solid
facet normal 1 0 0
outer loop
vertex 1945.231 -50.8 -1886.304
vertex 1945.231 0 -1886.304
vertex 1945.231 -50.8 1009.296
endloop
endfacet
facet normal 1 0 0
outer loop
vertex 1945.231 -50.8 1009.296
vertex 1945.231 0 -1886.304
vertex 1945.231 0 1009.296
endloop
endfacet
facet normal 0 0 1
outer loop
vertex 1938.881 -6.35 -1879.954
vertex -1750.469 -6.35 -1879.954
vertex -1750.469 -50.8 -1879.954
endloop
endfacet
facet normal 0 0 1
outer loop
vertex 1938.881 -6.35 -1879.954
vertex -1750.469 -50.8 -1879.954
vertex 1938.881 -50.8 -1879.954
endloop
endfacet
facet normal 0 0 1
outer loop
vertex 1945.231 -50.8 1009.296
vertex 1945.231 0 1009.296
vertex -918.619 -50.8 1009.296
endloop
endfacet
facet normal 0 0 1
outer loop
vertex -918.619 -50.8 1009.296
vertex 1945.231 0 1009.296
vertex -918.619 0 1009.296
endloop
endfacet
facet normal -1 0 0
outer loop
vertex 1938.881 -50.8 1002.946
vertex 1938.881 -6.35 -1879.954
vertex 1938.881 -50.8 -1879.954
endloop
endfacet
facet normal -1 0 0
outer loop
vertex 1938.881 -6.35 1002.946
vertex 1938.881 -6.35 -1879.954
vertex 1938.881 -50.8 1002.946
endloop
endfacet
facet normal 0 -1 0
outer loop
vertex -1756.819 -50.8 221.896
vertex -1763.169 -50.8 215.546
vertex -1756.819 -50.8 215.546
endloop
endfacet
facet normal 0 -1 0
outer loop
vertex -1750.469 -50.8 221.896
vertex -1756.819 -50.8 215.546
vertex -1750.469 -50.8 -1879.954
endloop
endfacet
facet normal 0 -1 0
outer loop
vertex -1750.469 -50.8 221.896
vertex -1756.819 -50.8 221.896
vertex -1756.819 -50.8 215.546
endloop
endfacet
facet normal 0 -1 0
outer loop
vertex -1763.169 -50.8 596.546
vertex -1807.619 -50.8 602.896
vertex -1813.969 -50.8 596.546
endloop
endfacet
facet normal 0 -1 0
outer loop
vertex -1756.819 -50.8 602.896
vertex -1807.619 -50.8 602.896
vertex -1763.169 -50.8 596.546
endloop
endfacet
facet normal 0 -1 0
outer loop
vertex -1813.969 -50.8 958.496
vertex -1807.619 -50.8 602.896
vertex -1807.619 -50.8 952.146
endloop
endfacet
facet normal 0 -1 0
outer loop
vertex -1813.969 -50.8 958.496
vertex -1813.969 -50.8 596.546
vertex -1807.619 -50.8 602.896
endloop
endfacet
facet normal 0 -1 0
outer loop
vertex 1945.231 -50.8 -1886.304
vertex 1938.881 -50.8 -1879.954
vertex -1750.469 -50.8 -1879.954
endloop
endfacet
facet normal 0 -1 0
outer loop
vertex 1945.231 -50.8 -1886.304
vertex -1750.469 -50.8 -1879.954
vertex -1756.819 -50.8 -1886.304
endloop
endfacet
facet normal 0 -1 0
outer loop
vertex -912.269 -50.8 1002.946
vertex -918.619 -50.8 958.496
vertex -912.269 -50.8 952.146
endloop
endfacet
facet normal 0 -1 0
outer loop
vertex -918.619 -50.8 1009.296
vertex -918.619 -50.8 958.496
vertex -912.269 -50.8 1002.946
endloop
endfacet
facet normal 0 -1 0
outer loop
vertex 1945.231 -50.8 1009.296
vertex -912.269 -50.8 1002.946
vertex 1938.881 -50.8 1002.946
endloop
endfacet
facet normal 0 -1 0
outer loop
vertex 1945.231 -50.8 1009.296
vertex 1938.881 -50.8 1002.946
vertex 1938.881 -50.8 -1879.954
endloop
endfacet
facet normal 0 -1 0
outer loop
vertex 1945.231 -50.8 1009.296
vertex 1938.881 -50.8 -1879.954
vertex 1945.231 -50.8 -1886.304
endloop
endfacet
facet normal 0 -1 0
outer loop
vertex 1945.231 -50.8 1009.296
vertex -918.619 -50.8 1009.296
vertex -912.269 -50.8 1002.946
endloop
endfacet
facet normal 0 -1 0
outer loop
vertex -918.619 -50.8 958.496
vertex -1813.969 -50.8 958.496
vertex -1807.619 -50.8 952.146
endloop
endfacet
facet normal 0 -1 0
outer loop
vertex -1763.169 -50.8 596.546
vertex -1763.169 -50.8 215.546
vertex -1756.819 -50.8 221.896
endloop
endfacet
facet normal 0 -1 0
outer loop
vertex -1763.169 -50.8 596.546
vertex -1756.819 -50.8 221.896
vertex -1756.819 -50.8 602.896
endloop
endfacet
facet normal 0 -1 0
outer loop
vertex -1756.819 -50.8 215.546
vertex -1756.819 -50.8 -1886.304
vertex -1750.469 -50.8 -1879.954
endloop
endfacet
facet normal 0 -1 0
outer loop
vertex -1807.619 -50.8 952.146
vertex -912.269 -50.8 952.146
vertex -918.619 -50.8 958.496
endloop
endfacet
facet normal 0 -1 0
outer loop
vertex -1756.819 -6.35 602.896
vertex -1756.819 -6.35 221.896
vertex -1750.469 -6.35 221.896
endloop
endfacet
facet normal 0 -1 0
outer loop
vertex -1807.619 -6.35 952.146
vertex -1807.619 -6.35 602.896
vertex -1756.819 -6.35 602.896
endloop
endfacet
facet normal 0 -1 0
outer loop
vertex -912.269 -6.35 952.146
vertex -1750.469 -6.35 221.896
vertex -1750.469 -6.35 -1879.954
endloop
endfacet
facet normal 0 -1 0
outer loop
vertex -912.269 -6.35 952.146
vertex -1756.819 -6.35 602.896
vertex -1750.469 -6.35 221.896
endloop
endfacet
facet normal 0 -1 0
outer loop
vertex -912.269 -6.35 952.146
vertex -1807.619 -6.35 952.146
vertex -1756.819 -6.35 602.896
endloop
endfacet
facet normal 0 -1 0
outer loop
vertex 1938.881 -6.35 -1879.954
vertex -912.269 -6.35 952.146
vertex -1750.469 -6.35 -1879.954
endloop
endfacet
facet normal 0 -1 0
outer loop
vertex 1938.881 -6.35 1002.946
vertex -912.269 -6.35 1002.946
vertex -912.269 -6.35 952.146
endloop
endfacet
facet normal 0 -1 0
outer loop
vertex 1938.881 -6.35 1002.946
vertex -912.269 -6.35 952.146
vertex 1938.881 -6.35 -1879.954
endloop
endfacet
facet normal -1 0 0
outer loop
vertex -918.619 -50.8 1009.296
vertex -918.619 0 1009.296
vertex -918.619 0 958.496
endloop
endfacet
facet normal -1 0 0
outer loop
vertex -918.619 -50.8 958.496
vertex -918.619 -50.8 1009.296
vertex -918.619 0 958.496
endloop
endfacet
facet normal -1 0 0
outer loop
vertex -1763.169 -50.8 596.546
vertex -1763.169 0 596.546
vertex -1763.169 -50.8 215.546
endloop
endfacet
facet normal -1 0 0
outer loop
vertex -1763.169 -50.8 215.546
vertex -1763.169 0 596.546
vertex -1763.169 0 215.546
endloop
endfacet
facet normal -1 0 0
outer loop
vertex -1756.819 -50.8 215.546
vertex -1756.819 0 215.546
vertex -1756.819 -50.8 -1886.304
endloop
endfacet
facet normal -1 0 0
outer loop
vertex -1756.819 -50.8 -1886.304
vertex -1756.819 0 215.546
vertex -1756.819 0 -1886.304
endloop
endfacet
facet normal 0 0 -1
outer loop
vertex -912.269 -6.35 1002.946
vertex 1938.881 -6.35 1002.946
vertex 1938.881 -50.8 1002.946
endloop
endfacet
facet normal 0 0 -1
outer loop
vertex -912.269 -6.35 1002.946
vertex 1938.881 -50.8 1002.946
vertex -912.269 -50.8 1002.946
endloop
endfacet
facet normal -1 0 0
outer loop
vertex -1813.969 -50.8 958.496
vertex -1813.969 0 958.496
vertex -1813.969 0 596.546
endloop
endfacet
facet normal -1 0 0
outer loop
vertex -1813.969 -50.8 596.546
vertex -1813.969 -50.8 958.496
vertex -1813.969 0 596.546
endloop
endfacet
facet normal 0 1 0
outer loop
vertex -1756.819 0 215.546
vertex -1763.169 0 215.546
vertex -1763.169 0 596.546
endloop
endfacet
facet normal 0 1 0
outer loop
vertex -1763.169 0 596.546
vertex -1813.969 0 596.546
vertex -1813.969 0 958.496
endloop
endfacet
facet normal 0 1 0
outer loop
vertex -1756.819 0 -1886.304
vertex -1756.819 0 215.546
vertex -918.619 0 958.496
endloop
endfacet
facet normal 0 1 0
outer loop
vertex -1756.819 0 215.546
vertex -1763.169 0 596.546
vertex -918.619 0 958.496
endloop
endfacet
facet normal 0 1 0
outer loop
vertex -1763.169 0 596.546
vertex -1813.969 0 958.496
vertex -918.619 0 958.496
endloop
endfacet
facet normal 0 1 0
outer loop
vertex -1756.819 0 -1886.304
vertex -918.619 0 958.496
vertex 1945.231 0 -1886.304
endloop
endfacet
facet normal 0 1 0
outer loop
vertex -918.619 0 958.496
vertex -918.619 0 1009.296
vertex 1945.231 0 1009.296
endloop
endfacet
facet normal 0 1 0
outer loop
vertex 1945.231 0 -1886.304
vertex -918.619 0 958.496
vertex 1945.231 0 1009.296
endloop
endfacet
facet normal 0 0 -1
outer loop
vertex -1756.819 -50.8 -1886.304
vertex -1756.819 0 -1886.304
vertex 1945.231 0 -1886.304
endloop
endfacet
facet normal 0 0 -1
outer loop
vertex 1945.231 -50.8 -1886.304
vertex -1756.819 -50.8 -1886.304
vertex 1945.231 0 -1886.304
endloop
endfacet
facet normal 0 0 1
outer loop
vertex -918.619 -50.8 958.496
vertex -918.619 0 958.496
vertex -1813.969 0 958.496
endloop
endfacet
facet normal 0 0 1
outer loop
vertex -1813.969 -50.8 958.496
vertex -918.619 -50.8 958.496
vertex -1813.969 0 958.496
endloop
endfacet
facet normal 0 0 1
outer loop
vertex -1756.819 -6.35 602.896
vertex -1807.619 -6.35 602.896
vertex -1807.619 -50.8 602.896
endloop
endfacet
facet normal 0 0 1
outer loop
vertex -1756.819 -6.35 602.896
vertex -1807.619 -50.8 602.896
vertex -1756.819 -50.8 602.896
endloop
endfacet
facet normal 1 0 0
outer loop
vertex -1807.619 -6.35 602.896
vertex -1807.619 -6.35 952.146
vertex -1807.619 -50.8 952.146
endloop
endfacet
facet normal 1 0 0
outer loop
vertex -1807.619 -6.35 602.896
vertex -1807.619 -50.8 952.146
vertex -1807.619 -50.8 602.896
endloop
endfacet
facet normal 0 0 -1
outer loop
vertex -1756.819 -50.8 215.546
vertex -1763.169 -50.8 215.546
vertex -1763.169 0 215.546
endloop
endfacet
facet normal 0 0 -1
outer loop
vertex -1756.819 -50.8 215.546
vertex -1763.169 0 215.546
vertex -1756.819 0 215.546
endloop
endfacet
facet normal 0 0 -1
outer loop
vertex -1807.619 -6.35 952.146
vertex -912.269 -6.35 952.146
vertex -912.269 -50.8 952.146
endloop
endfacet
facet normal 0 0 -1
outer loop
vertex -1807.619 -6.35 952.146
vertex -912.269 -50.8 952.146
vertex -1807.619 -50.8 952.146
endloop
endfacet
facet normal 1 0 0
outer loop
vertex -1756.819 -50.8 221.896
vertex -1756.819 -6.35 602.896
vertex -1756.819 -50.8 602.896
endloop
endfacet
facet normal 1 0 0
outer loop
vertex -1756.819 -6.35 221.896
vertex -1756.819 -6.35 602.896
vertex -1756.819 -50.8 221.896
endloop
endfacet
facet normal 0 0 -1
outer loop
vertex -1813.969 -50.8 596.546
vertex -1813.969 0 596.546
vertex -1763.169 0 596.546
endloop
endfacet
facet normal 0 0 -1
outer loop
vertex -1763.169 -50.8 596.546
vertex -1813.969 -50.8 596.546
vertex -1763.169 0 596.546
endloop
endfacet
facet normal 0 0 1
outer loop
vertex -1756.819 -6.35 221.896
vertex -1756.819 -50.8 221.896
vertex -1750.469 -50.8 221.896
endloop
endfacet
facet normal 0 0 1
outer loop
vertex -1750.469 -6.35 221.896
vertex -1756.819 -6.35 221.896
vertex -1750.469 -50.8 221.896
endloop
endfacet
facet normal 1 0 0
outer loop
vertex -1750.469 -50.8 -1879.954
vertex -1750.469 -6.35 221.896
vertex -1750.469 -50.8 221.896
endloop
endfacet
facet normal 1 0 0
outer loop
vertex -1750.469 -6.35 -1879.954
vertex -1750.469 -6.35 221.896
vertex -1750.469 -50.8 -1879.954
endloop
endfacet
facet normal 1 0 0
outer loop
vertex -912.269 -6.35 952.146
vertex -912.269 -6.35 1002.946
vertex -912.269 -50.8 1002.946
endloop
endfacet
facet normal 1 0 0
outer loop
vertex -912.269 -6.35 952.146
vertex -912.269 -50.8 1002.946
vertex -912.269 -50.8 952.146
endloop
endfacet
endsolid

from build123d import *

# Parameters (mm, degrees)
F1_DEPTH = 50.8
F2_T     = -6.35


with BuildPart() as f1:
    # F0 (on Front) → F1 (new body)
    with BuildSketch(Plane.XZ):
        Polygon((1945.2307024002, 1009.2962327003), (-918.6192975998, 1009.2962327003), (-918.6192975998, 958.4962327003), (-1813.9692975998, 958.4962327003), (-1813.9692975998, 596.5462327003), (-1763.1692975998, 596.5462327003), (-1763.1692975998, 215.5462327003), (-1756.8192975998, 215.5462327003), (-1756.8192975998, -1886.3037672997), (1945.2307024002, -1886.3037672997), align=None)
    extrude(amount=F1_DEPTH)

    # F2
    f2_openings = [f1.faces().sort_by_distance(p)[0] for p in [
        (95.851081, -50.8, -441.622342),
    ]]
    offset(amount=F2_T, openings=f2_openings, kind=Kind.INTERSECTION)


solid = f1.part
